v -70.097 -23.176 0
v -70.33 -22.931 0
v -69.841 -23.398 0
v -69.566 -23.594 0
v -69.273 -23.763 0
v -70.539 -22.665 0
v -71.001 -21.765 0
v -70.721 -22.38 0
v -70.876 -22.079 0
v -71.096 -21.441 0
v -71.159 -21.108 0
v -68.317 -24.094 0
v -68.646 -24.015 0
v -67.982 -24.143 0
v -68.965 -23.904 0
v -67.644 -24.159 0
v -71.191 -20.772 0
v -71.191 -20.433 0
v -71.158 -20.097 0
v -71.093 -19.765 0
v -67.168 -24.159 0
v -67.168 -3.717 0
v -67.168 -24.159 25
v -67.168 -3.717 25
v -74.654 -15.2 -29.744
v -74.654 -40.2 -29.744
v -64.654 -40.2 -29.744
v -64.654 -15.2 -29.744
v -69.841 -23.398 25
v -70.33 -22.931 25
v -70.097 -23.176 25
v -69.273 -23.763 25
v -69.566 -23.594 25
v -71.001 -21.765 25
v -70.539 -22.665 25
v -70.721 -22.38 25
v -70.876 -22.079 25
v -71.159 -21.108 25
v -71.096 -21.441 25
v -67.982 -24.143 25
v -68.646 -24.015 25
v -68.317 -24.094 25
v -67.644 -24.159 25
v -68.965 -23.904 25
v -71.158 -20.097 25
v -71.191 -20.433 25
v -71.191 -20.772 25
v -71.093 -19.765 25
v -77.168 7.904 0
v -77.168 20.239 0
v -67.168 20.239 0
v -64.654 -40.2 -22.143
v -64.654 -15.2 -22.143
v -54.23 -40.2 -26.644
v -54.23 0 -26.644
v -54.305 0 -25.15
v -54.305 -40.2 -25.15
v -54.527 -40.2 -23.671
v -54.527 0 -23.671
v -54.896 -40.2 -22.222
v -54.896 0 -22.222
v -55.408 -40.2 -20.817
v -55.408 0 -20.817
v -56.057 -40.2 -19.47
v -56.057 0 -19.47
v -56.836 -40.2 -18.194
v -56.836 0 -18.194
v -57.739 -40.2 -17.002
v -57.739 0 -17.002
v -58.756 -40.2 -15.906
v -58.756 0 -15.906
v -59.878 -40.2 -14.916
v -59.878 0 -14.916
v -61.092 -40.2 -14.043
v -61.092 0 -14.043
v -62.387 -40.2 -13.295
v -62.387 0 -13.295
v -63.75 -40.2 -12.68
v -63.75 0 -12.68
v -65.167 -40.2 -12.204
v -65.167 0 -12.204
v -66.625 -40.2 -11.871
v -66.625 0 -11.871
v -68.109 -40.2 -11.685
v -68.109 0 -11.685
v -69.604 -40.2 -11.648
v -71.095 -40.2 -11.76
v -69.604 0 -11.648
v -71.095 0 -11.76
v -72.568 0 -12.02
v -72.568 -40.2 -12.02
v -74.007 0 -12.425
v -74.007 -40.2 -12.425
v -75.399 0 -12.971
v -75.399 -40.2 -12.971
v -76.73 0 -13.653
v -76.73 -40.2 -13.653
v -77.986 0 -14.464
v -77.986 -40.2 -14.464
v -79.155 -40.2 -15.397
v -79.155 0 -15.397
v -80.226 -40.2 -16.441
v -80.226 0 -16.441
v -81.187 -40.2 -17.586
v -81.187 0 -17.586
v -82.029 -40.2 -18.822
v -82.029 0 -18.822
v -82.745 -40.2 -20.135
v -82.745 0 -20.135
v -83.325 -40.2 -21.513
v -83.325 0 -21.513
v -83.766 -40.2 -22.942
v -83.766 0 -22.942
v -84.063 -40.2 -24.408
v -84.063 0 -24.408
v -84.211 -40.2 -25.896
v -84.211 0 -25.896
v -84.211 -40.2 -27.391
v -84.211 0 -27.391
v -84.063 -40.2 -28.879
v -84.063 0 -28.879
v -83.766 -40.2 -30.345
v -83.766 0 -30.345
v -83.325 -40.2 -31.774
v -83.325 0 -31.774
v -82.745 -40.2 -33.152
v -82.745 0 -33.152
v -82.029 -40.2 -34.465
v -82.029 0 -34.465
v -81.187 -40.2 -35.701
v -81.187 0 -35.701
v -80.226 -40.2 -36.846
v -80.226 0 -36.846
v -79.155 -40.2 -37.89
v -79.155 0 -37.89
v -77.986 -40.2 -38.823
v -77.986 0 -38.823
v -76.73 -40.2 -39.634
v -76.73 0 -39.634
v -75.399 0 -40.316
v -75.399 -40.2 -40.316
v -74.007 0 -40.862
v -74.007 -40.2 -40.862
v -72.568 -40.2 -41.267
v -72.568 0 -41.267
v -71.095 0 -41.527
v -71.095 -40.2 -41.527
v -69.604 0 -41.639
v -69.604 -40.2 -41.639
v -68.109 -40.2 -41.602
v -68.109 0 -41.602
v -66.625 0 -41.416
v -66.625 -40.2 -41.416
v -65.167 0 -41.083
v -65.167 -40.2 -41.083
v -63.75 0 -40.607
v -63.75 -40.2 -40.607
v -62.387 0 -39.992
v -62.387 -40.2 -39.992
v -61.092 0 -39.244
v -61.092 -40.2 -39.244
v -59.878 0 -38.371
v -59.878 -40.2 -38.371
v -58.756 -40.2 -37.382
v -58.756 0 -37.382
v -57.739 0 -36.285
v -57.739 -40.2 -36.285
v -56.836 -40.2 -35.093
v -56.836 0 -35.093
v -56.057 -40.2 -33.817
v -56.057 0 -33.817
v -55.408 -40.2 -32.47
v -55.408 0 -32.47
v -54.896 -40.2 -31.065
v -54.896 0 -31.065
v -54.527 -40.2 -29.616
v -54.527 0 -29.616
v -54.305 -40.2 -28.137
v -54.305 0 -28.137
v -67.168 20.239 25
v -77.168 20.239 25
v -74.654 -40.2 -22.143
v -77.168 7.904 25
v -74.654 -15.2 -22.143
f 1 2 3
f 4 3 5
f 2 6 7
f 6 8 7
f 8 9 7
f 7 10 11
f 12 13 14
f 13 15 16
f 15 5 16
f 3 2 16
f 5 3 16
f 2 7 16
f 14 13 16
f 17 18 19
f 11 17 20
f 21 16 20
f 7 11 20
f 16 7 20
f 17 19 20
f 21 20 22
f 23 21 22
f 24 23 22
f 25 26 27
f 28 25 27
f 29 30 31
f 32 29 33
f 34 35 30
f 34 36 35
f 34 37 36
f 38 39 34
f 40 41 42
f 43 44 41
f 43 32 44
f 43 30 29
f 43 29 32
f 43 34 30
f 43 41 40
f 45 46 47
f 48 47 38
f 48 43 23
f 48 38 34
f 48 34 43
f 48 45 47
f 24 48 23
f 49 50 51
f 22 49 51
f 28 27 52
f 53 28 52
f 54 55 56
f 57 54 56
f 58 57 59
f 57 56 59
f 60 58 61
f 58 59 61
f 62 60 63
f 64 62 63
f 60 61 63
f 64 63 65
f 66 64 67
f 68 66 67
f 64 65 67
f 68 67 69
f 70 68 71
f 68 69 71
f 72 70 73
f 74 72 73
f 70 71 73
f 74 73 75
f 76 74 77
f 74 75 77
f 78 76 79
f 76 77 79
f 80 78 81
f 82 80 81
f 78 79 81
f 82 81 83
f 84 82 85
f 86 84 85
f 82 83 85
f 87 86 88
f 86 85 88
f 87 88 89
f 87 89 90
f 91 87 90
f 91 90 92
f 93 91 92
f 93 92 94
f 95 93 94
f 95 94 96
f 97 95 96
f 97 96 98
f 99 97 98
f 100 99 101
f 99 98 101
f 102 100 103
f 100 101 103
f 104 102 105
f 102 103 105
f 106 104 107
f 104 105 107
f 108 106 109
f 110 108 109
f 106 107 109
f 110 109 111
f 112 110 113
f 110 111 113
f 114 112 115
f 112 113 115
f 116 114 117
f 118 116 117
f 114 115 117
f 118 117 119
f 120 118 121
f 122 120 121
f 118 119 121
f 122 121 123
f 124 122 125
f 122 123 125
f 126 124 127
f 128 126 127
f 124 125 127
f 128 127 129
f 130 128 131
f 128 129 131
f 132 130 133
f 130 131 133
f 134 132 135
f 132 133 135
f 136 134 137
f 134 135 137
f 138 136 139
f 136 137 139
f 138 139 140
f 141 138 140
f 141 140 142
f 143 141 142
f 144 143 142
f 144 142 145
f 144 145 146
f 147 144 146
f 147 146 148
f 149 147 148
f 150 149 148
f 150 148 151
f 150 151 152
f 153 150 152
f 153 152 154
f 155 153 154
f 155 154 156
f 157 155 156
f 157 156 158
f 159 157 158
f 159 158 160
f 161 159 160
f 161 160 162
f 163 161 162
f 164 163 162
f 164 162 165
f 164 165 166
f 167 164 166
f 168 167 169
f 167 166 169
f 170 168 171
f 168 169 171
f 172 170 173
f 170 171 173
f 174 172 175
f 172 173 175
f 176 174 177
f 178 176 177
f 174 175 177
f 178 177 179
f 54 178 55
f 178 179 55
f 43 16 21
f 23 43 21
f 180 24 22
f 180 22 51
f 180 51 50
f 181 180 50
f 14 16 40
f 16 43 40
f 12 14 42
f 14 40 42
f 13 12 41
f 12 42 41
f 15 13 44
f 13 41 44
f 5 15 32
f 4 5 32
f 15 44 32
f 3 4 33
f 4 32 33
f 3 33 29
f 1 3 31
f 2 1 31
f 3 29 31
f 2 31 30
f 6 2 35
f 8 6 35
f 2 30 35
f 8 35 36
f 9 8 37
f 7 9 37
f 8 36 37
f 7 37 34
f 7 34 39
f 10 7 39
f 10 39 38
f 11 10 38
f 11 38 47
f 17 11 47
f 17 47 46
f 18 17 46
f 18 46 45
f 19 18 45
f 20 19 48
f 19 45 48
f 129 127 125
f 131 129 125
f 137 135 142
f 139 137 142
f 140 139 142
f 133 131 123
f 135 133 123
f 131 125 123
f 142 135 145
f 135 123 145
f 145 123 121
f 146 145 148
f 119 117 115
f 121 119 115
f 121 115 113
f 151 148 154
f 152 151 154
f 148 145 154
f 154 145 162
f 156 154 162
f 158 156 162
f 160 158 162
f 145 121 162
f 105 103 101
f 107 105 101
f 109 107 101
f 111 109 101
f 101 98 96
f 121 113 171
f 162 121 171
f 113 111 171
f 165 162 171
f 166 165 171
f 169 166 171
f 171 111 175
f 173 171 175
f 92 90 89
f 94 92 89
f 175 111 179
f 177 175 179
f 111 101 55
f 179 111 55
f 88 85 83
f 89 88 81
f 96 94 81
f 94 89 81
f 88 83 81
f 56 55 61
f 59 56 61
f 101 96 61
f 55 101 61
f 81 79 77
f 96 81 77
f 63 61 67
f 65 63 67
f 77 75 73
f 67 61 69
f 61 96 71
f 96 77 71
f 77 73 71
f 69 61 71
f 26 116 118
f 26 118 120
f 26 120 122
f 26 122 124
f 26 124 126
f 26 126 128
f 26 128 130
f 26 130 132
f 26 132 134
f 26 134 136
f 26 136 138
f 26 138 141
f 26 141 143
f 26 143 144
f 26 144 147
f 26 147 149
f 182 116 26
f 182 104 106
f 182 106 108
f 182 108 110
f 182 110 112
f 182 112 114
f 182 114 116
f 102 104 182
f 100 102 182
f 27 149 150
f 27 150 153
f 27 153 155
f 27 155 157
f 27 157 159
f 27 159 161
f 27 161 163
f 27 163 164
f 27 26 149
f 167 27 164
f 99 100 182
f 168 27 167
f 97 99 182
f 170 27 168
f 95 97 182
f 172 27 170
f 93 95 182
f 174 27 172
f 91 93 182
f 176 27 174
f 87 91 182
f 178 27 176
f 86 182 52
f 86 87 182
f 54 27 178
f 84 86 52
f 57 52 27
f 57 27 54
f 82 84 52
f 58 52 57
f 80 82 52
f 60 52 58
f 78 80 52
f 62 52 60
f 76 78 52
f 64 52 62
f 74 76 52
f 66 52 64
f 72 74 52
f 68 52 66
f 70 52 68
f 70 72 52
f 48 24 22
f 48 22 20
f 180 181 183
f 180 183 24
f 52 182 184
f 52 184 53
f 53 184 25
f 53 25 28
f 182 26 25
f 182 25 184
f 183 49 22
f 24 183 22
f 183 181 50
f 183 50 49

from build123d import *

# Parameters (mm, degrees)
F1_DEPTH = 25
F2_R     = 3.550389
F3_R     = 15
F4_DEPTH = 40.2
F5_W     = 10
F5_H     = 7.600841
F6_DEPTH = 25


with BuildPart() as f1:
    # F0 (on Top) → F1 (new body)
    with BuildSketch(Plane.XY):
        Polygon((-67.167886, 20.239018), (-77.167886, 20.239018), (-77.167886, 7.904011), (-67.167886, -3.716852), align=None)
        Polygon((-67.167886, -24.158722), (-67.167886, -3.716852), (-72.167886, -24.158722), align=None)
    extrude(amount=F1_DEPTH)

    # F2
    f2_edges = [f1.edges().sort_by_distance(p)[0] for p in [
        (-72.167886, -24.158722, 12.5),
    ]]
    fillet(f2_edges, radius=F2_R)


with BuildPart() as f4:
    # F3 (on Front) → F4 (new body)
    with BuildSketch(Plane.XZ):
        with Locations((-69.23005, -26.643518)):
            Circle(F3_R)
    extrude(amount=F4_DEPTH)

    # F5 (on face) → F6 (cut)
    with BuildSketch(Plane.XZ.offset(40.2)):
        with Locations((-69.653824, -25.943869)):
            Rectangle(F5_W, F5_H)
    extrude(amount=-F6_DEPTH, mode=Mode.SUBTRACT)


solid = Compound([f1.part, f4.part])
